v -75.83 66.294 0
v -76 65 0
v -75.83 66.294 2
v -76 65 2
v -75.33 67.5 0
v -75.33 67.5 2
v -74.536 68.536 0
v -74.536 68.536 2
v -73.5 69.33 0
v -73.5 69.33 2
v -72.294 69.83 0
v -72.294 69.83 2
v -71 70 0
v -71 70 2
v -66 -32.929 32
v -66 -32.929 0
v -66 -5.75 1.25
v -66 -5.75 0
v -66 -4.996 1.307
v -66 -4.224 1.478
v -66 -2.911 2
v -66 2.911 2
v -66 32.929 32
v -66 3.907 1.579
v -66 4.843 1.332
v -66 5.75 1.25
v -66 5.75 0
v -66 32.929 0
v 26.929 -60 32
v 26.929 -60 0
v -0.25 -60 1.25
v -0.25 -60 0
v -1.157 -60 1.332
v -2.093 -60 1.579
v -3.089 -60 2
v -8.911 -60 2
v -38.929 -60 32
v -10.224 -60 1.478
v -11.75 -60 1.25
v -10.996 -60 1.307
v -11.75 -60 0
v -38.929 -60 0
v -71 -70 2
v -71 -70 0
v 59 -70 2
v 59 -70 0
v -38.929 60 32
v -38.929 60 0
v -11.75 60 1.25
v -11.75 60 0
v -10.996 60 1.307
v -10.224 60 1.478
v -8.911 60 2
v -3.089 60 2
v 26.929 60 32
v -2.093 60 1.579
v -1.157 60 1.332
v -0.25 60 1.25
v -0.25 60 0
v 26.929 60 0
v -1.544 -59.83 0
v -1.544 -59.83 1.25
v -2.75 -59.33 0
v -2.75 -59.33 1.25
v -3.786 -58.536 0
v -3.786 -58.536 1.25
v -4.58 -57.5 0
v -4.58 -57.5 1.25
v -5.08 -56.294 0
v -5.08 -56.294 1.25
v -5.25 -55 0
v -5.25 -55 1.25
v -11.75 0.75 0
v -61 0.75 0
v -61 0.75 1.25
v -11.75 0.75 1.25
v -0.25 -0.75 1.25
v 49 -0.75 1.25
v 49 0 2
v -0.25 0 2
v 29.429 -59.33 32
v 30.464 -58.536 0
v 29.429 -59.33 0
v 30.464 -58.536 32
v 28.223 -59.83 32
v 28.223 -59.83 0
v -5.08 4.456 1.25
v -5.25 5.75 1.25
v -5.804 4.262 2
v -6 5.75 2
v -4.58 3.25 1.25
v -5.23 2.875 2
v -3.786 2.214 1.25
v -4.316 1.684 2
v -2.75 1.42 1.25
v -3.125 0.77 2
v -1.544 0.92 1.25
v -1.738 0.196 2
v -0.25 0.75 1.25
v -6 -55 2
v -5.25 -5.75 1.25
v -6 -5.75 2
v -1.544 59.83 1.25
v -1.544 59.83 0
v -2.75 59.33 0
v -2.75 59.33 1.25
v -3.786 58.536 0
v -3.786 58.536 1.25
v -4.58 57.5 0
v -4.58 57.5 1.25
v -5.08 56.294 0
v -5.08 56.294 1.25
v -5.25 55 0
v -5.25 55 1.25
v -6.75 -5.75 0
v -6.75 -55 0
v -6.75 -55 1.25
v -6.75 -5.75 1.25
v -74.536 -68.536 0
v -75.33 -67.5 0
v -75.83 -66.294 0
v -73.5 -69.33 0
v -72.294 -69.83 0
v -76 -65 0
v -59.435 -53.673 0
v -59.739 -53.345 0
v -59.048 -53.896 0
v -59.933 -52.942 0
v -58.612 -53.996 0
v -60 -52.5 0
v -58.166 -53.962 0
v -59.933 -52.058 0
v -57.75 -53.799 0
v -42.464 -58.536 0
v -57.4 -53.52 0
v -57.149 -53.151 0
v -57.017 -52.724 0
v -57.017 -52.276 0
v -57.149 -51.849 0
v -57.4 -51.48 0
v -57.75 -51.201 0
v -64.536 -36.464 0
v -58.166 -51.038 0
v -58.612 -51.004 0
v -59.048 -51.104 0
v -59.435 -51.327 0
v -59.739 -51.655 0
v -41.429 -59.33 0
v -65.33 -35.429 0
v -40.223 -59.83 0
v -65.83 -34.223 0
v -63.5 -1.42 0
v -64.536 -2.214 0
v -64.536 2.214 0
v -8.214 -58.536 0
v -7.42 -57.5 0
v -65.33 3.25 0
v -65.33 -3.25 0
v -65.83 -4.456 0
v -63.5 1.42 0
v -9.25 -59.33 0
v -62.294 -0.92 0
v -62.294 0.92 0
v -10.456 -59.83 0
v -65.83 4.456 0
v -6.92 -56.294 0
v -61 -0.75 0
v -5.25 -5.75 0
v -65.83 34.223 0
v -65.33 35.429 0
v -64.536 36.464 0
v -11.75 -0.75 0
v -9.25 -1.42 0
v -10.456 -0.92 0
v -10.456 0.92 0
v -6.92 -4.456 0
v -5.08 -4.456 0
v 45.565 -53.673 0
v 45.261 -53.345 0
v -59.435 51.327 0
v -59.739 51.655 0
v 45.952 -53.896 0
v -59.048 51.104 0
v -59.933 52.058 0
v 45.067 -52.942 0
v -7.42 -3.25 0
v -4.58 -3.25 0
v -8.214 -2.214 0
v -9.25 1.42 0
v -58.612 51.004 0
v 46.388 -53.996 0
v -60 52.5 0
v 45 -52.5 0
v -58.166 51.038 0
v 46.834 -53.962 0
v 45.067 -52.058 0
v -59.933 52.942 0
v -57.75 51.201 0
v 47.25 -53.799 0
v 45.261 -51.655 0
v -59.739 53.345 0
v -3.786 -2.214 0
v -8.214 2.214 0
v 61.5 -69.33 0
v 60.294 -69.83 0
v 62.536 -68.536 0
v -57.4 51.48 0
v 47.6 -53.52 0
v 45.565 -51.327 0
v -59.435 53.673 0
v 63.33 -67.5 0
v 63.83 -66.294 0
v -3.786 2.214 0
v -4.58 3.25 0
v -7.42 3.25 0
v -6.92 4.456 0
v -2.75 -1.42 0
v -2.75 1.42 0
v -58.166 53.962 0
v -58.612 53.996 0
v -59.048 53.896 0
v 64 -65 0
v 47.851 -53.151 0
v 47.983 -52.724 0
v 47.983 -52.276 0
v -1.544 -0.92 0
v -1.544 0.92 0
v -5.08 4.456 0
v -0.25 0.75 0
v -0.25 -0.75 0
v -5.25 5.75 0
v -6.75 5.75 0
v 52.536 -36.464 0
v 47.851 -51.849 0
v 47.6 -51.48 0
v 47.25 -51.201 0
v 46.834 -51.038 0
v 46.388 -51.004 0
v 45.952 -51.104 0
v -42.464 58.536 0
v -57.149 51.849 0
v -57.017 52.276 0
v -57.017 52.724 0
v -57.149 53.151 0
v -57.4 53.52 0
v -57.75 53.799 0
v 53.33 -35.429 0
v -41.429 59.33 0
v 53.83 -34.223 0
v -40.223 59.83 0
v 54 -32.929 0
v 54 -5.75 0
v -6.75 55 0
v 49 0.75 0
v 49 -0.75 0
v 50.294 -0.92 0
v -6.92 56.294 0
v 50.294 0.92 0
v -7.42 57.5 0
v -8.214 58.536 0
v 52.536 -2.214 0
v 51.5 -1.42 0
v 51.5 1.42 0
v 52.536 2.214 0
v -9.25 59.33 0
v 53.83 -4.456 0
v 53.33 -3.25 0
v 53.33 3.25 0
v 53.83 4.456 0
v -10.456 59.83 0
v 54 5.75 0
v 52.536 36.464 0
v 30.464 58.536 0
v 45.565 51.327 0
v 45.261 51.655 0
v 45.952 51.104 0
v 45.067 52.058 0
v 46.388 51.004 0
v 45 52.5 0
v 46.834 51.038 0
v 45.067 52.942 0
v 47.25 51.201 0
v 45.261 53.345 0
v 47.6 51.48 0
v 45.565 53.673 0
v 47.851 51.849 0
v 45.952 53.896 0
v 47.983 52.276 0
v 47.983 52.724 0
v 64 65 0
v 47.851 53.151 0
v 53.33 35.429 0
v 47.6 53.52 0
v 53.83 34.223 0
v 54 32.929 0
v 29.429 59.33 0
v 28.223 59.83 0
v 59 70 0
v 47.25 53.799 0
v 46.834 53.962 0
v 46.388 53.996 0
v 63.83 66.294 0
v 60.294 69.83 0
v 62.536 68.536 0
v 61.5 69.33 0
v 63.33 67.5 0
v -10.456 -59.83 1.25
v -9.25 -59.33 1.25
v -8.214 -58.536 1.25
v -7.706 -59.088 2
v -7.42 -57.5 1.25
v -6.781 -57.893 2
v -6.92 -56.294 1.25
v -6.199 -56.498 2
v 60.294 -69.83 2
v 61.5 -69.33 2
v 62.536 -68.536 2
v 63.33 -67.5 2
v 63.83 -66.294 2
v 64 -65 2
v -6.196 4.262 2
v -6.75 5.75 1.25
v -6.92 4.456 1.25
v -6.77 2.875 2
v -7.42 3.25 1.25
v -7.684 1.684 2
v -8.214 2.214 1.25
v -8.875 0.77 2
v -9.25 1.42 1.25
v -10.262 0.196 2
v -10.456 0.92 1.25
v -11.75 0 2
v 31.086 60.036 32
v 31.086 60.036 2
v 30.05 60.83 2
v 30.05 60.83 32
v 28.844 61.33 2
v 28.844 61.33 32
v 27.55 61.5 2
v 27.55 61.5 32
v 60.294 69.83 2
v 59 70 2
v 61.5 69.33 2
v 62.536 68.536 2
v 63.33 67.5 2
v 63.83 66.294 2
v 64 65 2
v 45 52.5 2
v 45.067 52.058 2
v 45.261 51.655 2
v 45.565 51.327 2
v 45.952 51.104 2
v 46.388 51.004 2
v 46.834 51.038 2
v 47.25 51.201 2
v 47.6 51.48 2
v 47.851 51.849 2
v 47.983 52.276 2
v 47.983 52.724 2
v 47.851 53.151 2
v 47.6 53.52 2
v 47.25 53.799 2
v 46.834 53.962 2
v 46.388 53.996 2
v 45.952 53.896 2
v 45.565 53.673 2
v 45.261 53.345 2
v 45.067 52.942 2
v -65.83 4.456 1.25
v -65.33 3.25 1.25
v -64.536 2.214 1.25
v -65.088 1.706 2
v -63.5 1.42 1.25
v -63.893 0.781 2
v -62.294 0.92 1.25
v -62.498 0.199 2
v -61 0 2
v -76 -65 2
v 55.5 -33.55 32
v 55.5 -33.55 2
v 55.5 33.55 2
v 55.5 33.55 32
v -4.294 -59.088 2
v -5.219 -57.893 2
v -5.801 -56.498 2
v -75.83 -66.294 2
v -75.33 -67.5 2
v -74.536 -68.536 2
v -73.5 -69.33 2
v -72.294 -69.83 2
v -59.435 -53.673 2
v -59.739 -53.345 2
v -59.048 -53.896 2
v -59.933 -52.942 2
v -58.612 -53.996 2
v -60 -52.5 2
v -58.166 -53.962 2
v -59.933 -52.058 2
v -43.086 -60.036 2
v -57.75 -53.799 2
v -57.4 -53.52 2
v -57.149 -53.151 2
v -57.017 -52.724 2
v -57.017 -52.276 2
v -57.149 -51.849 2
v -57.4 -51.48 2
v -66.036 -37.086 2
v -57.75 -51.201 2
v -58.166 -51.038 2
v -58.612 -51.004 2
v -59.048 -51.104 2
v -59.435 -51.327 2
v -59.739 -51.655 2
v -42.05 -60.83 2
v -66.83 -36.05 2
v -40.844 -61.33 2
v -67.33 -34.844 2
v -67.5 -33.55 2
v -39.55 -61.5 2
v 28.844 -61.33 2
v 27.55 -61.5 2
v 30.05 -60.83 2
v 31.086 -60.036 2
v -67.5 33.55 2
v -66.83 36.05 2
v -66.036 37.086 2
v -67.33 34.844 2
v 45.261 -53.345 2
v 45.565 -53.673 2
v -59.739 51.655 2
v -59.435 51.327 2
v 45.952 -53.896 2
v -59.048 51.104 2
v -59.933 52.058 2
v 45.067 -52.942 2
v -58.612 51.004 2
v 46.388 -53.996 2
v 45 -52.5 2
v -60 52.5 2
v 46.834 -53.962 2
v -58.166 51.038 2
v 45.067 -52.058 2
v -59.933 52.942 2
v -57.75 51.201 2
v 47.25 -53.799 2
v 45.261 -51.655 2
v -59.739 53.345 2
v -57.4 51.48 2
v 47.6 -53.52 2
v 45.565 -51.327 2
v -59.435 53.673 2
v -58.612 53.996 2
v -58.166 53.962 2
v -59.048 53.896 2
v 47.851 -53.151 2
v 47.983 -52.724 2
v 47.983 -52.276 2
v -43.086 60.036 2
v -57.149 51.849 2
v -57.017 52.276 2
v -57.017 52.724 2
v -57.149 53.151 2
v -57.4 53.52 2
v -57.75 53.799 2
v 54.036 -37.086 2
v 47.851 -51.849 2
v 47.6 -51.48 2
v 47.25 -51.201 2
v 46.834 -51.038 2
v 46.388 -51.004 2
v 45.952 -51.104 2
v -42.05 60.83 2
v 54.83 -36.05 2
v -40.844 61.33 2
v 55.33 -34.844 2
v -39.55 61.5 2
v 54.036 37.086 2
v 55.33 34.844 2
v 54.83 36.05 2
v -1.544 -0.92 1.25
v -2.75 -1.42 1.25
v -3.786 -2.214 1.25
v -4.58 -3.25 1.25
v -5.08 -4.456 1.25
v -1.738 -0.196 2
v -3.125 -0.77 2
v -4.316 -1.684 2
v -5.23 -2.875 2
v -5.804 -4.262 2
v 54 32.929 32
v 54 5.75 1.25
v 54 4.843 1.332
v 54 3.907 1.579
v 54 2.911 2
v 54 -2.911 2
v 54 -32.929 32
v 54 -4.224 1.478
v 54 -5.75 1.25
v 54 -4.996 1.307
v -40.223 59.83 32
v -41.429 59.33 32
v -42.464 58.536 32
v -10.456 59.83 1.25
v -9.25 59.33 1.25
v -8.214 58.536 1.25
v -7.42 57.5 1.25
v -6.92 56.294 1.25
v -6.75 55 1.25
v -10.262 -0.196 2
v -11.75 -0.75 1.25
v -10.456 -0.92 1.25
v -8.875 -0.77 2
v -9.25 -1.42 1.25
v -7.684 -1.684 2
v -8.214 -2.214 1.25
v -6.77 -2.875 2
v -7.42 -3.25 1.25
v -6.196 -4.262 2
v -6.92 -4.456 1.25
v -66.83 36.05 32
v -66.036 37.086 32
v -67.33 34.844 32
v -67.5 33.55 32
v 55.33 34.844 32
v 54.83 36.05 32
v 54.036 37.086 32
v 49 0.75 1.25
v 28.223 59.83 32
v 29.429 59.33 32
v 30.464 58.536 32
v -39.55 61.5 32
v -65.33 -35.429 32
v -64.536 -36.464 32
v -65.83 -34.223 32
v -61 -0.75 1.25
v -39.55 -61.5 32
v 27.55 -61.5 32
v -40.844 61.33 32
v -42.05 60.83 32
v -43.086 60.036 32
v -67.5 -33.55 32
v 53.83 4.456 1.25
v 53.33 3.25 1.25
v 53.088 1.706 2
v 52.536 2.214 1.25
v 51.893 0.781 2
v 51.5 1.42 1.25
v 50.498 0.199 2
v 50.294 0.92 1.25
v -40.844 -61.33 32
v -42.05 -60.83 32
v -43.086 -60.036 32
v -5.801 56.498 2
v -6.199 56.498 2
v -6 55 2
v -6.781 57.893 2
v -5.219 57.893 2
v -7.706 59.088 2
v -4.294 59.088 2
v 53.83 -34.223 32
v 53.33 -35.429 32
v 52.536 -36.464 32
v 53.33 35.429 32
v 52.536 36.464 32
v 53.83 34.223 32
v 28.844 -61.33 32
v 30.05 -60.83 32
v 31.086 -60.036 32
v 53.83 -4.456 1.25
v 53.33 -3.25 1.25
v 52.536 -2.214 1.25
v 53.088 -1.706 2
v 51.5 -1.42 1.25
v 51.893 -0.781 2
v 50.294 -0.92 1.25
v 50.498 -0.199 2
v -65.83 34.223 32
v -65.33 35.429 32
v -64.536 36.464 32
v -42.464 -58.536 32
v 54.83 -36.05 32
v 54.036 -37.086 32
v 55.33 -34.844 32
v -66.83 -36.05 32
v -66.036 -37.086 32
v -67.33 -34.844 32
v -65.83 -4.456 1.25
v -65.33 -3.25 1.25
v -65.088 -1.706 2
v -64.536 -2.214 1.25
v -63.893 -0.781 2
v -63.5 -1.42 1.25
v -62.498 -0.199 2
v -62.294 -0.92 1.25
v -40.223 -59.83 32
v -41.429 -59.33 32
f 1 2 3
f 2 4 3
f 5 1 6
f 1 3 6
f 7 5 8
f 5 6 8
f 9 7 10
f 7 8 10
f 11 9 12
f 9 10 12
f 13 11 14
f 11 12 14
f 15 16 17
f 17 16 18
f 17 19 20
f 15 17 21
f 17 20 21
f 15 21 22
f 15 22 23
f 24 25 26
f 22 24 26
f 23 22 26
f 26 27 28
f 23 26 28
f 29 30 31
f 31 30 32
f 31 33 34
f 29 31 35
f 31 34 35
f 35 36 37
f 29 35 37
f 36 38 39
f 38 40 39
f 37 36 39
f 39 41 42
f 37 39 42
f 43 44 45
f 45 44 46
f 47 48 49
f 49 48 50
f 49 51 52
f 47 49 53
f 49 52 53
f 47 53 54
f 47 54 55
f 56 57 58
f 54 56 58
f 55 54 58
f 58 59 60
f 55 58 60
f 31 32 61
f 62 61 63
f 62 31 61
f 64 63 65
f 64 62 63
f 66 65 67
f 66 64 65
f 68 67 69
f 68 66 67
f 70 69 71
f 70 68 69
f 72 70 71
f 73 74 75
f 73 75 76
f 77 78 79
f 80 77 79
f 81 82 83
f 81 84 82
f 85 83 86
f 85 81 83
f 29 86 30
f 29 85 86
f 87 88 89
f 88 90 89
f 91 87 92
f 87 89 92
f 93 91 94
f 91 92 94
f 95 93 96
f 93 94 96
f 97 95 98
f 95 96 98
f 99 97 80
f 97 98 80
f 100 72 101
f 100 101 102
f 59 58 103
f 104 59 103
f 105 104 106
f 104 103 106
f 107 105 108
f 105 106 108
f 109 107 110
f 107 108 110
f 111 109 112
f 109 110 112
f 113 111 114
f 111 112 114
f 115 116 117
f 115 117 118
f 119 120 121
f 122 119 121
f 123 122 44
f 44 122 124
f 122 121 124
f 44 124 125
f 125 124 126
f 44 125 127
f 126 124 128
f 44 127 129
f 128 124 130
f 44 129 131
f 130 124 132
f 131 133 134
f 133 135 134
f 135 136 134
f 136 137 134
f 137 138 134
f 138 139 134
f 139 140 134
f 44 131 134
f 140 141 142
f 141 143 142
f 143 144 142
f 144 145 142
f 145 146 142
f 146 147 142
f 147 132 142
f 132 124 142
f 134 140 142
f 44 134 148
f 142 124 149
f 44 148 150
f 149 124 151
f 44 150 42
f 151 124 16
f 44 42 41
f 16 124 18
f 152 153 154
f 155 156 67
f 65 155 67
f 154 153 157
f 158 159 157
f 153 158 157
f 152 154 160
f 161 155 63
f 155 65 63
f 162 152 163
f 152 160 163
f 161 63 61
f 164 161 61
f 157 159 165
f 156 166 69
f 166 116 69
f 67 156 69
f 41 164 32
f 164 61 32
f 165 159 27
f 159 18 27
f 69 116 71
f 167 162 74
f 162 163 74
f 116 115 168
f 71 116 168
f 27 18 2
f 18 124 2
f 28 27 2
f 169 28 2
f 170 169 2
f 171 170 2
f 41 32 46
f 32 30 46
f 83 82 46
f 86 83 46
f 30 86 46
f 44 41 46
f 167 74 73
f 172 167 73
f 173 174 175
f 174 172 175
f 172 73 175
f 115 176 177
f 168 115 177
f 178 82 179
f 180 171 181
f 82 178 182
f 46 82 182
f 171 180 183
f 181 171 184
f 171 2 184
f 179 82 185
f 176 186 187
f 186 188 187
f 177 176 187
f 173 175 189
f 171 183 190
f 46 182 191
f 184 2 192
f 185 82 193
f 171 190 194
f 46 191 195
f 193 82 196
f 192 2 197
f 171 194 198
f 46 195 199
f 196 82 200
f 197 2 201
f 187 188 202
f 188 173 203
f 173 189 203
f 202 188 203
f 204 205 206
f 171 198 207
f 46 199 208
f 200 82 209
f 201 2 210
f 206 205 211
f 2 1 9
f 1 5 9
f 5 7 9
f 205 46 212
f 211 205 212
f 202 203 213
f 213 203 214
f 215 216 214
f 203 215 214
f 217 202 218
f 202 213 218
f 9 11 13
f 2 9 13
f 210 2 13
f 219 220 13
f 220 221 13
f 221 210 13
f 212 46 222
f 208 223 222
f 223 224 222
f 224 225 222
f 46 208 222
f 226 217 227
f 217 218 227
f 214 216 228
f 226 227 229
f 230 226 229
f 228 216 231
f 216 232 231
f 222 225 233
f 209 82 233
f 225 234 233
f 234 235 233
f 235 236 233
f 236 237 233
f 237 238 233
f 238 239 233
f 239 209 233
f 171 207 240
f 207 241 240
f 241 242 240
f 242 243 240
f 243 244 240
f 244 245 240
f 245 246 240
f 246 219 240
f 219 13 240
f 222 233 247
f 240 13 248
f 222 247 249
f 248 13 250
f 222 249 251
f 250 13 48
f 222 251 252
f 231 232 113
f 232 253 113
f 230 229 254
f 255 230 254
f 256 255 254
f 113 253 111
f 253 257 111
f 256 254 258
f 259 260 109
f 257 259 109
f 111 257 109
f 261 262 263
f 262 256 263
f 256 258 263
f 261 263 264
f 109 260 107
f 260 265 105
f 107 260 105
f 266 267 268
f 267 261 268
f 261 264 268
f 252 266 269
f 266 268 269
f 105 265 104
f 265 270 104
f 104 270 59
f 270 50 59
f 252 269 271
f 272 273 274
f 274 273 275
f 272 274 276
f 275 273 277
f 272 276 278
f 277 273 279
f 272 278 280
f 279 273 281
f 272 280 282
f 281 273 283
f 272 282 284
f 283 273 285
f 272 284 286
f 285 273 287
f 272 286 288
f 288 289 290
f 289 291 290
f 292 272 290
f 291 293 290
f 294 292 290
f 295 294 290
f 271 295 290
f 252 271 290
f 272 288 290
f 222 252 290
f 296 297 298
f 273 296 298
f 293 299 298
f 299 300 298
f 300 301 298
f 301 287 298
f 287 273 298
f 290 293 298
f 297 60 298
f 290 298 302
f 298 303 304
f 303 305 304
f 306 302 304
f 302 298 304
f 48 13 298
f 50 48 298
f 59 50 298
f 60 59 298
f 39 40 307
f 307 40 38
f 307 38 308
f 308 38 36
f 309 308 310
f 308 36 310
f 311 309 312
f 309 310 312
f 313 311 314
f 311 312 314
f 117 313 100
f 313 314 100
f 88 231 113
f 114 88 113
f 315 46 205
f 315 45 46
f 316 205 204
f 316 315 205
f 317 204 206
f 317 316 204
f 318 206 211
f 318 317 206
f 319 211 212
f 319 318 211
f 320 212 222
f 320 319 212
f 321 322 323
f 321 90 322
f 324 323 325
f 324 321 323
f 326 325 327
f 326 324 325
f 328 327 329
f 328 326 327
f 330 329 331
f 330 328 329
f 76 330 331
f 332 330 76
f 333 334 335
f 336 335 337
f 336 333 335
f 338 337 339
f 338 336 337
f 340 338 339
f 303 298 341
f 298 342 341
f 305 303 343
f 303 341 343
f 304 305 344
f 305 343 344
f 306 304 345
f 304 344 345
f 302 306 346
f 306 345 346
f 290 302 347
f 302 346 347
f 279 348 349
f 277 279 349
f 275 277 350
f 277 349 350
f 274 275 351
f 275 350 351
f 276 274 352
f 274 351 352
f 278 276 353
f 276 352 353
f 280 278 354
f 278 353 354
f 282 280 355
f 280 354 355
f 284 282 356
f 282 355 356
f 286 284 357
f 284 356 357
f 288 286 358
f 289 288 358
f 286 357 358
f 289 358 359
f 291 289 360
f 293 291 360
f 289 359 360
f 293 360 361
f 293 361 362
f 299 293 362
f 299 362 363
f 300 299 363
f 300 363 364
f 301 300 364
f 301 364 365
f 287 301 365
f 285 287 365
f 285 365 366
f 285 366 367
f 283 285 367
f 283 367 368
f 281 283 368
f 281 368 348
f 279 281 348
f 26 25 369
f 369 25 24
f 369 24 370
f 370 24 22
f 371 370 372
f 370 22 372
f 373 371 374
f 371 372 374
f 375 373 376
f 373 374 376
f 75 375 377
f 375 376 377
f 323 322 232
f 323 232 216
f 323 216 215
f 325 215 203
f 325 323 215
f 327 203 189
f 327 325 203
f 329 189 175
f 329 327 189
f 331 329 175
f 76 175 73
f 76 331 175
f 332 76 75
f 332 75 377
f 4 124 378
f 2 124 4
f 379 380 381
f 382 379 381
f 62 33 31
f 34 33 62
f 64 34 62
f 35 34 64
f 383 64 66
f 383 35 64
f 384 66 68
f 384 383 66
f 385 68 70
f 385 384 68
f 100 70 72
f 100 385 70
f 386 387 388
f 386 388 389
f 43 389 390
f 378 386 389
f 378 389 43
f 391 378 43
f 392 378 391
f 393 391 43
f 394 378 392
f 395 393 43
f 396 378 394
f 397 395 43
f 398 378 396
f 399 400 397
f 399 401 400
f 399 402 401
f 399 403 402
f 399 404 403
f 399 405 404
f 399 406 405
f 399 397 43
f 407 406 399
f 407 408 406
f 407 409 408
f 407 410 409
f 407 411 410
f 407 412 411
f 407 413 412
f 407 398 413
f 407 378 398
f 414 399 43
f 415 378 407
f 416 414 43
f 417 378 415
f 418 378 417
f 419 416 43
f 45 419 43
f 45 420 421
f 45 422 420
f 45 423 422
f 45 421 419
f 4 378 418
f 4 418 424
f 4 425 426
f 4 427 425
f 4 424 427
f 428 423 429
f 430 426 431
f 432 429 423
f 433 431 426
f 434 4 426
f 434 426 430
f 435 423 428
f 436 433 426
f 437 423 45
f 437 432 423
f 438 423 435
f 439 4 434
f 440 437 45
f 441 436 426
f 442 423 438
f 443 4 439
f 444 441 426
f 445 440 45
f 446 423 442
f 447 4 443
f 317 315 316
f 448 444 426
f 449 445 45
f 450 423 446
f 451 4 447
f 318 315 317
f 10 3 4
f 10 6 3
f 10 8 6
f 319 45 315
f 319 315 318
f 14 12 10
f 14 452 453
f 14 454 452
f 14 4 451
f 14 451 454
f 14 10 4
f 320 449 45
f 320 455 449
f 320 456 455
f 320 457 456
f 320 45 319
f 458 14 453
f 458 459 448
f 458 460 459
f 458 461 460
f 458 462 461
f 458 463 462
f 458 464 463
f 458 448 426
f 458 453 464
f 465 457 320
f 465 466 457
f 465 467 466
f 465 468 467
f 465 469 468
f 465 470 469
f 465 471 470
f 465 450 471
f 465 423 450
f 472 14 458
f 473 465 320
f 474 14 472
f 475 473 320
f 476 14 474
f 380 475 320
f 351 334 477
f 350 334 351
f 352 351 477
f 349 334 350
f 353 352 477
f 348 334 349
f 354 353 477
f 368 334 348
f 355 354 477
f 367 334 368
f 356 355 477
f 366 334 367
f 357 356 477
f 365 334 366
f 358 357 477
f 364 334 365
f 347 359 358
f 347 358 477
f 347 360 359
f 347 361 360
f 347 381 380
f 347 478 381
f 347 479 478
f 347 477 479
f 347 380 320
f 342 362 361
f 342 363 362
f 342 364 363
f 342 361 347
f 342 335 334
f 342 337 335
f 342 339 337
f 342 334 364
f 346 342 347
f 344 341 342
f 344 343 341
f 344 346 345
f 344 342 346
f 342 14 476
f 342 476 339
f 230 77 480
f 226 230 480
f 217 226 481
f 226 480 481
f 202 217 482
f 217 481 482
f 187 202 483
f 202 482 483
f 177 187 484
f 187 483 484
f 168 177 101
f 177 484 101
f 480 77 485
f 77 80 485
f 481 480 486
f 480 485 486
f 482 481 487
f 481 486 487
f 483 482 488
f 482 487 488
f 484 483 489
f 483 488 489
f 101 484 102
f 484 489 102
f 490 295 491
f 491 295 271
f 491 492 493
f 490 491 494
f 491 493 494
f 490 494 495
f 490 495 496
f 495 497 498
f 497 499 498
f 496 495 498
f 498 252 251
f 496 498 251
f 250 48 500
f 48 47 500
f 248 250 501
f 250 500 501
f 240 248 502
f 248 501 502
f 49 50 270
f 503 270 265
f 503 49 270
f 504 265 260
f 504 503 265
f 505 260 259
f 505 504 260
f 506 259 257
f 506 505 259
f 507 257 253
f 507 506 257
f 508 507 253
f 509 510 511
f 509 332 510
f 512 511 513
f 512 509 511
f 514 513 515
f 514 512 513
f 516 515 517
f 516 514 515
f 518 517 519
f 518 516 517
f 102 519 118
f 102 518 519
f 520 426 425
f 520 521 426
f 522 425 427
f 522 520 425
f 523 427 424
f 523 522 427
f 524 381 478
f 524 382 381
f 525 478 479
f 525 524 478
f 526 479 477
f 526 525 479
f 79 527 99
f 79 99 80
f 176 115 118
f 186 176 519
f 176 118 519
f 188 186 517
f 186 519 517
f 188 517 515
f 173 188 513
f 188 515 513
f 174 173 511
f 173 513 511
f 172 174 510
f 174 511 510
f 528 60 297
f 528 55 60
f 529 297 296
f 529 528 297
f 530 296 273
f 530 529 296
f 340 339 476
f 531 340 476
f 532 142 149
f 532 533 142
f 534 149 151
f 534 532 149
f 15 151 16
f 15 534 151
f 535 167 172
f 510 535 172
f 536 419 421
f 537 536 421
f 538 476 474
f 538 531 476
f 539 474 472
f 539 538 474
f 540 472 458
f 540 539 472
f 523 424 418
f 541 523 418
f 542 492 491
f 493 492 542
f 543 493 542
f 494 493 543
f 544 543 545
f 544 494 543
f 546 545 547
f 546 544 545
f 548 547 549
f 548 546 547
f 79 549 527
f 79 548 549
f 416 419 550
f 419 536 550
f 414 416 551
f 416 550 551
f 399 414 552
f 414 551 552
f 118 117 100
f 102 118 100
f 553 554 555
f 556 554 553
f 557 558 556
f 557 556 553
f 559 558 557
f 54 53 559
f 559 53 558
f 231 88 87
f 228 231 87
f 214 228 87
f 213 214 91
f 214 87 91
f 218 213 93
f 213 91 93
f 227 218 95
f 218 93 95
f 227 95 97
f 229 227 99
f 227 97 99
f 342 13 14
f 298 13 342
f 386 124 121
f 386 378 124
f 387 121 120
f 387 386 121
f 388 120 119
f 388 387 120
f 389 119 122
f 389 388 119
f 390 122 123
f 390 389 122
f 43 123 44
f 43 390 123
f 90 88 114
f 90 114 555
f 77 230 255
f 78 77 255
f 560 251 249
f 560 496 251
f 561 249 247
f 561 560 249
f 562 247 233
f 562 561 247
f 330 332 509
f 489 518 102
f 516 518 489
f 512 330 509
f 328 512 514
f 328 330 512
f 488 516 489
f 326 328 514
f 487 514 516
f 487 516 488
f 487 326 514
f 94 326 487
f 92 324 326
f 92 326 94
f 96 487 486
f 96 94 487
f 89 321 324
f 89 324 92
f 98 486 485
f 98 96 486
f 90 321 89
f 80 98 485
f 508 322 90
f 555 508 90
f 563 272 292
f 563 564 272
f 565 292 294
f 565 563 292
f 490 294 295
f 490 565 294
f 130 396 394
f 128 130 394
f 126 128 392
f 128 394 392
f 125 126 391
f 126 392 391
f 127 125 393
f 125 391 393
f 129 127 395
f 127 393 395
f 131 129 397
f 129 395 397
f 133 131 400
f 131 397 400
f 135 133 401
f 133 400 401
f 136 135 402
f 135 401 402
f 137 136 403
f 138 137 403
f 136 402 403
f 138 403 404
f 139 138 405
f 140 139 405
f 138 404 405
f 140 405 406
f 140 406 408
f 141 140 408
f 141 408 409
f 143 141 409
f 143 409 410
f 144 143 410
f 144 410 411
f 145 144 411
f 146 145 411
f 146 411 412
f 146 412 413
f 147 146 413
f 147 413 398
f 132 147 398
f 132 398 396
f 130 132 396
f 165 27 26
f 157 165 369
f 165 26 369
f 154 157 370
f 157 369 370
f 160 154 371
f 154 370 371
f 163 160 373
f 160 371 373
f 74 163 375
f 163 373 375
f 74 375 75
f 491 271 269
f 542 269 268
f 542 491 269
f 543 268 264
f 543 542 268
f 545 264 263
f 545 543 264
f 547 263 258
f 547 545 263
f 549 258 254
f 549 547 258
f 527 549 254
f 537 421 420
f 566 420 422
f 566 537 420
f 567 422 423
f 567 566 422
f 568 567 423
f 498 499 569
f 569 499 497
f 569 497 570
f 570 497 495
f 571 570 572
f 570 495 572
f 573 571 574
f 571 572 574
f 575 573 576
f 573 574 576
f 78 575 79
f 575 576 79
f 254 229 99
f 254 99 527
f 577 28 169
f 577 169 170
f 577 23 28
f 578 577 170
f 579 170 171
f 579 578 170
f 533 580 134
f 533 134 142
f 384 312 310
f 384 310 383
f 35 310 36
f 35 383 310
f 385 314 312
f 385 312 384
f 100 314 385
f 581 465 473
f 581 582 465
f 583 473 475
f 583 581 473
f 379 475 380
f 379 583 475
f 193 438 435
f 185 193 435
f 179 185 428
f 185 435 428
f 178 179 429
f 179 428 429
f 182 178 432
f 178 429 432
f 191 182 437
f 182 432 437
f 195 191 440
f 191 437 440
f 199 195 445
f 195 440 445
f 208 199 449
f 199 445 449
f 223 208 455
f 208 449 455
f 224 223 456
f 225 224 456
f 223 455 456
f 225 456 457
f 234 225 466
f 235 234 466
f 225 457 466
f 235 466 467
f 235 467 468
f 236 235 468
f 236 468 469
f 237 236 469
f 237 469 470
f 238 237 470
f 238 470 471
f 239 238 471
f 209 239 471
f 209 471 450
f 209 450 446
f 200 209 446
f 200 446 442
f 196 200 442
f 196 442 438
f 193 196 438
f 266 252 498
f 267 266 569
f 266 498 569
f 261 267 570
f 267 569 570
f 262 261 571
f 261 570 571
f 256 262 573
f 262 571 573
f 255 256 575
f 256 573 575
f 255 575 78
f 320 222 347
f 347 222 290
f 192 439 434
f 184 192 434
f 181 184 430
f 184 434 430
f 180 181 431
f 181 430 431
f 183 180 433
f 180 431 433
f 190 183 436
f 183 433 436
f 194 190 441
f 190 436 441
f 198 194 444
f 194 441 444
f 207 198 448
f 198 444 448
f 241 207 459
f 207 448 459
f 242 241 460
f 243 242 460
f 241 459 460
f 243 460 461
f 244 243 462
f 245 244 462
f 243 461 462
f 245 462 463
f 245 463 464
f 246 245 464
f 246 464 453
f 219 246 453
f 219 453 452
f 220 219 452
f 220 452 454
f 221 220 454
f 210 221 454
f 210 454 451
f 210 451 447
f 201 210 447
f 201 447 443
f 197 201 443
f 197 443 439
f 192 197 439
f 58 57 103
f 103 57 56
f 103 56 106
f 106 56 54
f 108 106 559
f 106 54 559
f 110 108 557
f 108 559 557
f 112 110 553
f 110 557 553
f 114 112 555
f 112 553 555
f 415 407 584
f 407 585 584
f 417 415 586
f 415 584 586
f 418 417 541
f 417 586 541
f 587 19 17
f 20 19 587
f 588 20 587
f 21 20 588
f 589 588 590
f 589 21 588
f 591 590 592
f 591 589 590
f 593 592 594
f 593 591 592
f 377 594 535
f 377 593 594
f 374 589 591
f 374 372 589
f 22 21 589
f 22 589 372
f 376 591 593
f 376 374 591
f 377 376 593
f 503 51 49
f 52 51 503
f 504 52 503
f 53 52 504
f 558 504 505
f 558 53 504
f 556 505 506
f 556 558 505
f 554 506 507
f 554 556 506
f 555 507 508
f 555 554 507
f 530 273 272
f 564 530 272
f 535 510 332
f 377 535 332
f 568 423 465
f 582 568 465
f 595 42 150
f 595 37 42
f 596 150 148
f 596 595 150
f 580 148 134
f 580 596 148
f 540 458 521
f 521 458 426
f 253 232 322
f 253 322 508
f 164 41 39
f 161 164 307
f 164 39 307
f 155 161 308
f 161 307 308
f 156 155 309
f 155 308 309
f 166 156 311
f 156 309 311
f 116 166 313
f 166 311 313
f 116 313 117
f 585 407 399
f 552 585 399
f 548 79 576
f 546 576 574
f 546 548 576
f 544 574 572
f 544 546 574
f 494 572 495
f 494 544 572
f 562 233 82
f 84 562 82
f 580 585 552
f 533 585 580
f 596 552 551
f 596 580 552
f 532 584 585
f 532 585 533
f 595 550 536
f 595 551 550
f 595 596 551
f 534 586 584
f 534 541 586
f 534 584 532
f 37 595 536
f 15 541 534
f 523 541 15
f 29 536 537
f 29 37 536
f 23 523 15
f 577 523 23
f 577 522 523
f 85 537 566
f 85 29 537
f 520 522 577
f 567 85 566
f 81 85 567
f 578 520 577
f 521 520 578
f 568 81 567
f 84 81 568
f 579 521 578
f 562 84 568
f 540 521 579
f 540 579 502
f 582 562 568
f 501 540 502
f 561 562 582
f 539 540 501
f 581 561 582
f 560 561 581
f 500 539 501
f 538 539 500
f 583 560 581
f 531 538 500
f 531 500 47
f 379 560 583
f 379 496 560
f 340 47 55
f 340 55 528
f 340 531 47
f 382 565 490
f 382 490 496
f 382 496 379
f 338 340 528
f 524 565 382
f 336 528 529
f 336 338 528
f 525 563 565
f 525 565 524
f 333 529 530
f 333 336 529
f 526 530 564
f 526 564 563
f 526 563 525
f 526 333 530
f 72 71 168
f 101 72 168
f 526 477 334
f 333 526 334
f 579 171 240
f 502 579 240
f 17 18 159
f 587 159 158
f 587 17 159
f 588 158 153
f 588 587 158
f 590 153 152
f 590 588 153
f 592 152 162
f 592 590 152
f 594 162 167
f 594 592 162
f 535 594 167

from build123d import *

# Parameters (mm, degrees)
F0_W         = 59.25
F0_H         = 1.5
F0_W_2       = 1.5
F0_H_2       = 59.25
F1_DEPTH     = 2
F0_W_3       = 140
F0_H_3       = 140
F2_DEPTH     = 32
F3_D         = 3
F4_R         = 5
F5_T1_DEPTH  = 49.25
F5_T3_DEPTH  = 49.25
F5_T5_DEPTH  = 49.25
F5_T7_DEPTH  = 49.25
F5_T12_ANGLE = 127.5884718038
F5_T15_ANGLE = 90
F5_T19_ANGLE = 127.5884718038
F5_T24_ANGLE = 127.5884718038
F5_T27_ANGLE = 90
F5_T31_ANGLE = 127.5884718038
F5_T36_ANGLE = 127.5884718038
F5_T39_ANGLE = 90
F5_T43_ANGLE = 127.5884718038
F5_T48_ANGLE = 127.5884718038
F5_T53_ANGLE = 127.5884718038
F5_T56_ANGLE = 90


# Not quite as in the source:
# - a fillet or chamfer that OpenCascade refuses, or shapes differently, is made with other operations: its cross-section is extruded or revolved along the edge and cut away or added


with BuildPart() as f1:
    # F0 (on Top) → F1 (new body)
    with BuildSketch(Plane.XY):
        with Locations((-36.375, 0)):
            Rectangle(F0_W, F0_H)
        with Locations((-6, 30.375)):
            Rectangle(F0_W_2, F0_H_2)
        with Locations((-6, -30.375)):
            Rectangle(F0_W_2, F0_H_2)
        with Locations((24.375, 0)):
            Rectangle(F0_W, F0_H)
        with Locations((-6, 0)):
            Rectangle(F0_W_2, F0_H)
    extrude(amount=F1_DEPTH)



with BuildPart() as f1b:
    # F0 (on Top) → F1, piece 2 (new body)
    with BuildSketch(Plane.XY):
        with Locations((-6, 0)):
            Rectangle(F0_W_3, F0_H_3)
        Polygon((55.5000009226, -35.6213207257), (29.6213207257, -61.5000009226), (-41.6213207257, -61.5000009226), (-67.5000009226, -35.6213207257), (-67.5000009226, 35.6213207257), (-41.6213207257, 61.5000009226), (29.6213207257, 61.5000009226), (55.5000009226, 35.6213207257), align=None, mode=Mode.SUBTRACT)
    extrude(amount=F1_DEPTH)


with BuildPart() as f1_1:
    add(f1.part)

    add(f1b.part)  # F2 merges F1b
    # F0 (on Top) → F2 (join)
    with BuildSketch(Plane.XY):
        Polygon((-41.6213207257, -61.5000009226), (29.6213207257, -61.5000009226), (55.5000009226, -35.6213207257), (55.5000009226, 35.6213207257), (29.6213207257, 61.5000009226), (-41.6213207257, 61.5000009226), (-67.5000009226, 35.6213207257), (-67.5000009226, -35.6213207257), align=None)
        Polygon((29, 60), (54, 35), (54, 0.75), (54, -0.75), (54, -35), (29, -60), (-5.25, -60), (-6.75, -60), (-41, -60), (-66, -35), (-66, -0.75), (-66, 0.75), (-66, 35), (-41, 60), (-6.75, 60), (-5.25, 60), align=None, mode=Mode.SUBTRACT)
    extrude(amount=F2_DEPTH)

    # F3 (through all)
    with Locations(Plane(origin=(0, 0, 0), x_dir=(1, 0, 0), z_dir=(0, 0, -1))):
        with Locations((-58.5, -52.5), (-58.5, 52.5), (46.5, 52.5), (46.5, -52.5)):
            Hole(F3_D / 2)

    # F4
    f4_edges = [f1_1.edges().sort_by_distance(p)[0] for p in [
        (-6.75, 60, 1),
        (-6.75, 0.75, 1),
        (-41, 60, 16),
        (-66, 35, 16),
        (-66, -0.75, 1),
        (-66, 0.75, 1),
        (-66, -35, 16),
        (-6.75, -0.75, 1),
        (-6.75, -60, 1),
        (29, -60, 16),
        (54, -35, 16),
        (54, -0.75, 1),
        (-5.25, -0.75, 1),
        (-5.25, -60, 1),
        (29, 60, 16),
        (54, 35, 16),
        (54, 0.75, 1),
        (-5.25, 0.75, 1),
        (-5.25, 60, 1),
        (-41, -60, 16),
        (-76, -70, 1),
        (64, -70, 1),
        (64, 70, 1),
        (-76, 70, 1),
        (-67.500001, -35.621321, 17),
        (-41.621321, -61.500001, 17),
        (29.621321, -61.500001, 17),
        (55.500001, -35.621321, 17),
        (55.500001, 35.621321, 17),
        (29.621321, 61.500001, 17),
        (-41.621321, 61.500001, 17),
        (-67.500001, 35.621321, 17),
    ]]
    fillet(f4_edges, radius=F4_R)

    # F5: chamfer of 0.75 on 20 edges, made by hand

    # F5_s2 → F5_t1 (cut)
    with BuildSketch(Plane.YZ.offset(-61)):
        Polygon((-0.75, 1.25), (0, 2), (-0.75, 2), align=None)
        Polygon((0.75, 1.25), (0, 2), (0.75, 2), align=None)
    extrude(amount=F5_T1_DEPTH, mode=Mode.SUBTRACT)

    # F5_s4 → F5_t3 (cut)
    with BuildSketch(Plane.YZ.offset(-0.25)):
        Polygon((-0.75, 1.25), (0, 2), (-0.75, 2), align=None)
        Polygon((0.75, 1.25), (0, 2), (0.75, 2), align=None)
    extrude(amount=F5_T3_DEPTH, mode=Mode.SUBTRACT)

    # F5_s6 → F5_t5 (cut)
    with BuildSketch(Plane.XZ.offset(-55)):
        Polygon((-5.25, 1.25), (-6, 2), (-5.25, 2), align=None)
        Polygon((-6.75, 1.25), (-6, 2), (-6.75, 2), align=None)
    extrude(amount=F5_T5_DEPTH, mode=Mode.SUBTRACT)

    # F5_s8 → F5_t7 (cut)
    with BuildSketch(Plane.XZ.offset(5.75)):
        Polygon((-6.75, 1.25), (-6, 2), (-6.75, 2), align=None)
        Polygon((-5.25, 1.25), (-6, 2), (-5.25, 2), align=None)
    extrude(amount=F5_T7_DEPTH, mode=Mode.SUBTRACT)


with BuildPart() as f5_tool10:
    # F5_s11 → F5_t12 (revolve)
    with BuildSketch(Plane(origin=(-19.9177172188, 25.8744507102, 0), x_dir=(0, 0, 1), z_dir=(0.6099857389, -0.7924123916, 0))):
        Polygon((1.25, 56.8445738842), (2, 57.5945738842), (2, 56.8445738842), align=None)
    revolve(axis=Axis((-61, -5.75, 2), (0, 0, -1)), revolution_arc=F5_T12_ANGLE)

    split(bisect_by=Plane.YZ.offset(-66), keep=Keep.TOP)


with BuildPart() as f1_2:
    add(f1_1.part)

    # F5_t9: cut F5_tool10
    add(f5_tool10.part, mode=Mode.SUBTRACT)

    # F5_s14 → F5_t15 (revolve, cut)
    with BuildSketch(Plane.YZ.offset(-11.75)):
        Polygon((-0.75, 1.25), (0, 2), (-0.75, 2), align=None)
    revolve(axis=Axis((-11.75, -5.75, 2), (0, 0, -1)), revolution_arc=F5_T15_ANGLE, mode=Mode.SUBTRACT)


with BuildPart() as f5_tool17:
    # F5_s18 → F5_t19 (revolve)
    with BuildSketch(Plane(origin=(19.2067847712, -14.7850600594, 0), x_dir=(0, 0, 1), z_dir=(-0.7924123916, 0.6099857389, 0))):
        Polygon((1.25, -55.7500139684), (2, -56.5000139684), (2, -55.7500139684), align=None)
    revolve(axis=Axis((-11.75, -55, 2), (0, 0, 1)), revolution_arc=F5_T19_ANGLE)

    split(bisect_by=Plane.XZ.offset(60), keep=Keep.BOTTOM)


with BuildPart() as f1_3:
    add(f1_2.part)

    # F5_t16: cut F5_tool17
    add(f5_tool17.part, mode=Mode.SUBTRACT)


with BuildPart() as f5_tool22:
    # F5_s23 → F5_t24 (revolve)
    with BuildSketch(Plane(origin=(15.4527259985, 20.0741276118, 0), x_dir=(0, 0, 1), z_dir=(-0.6099857389, -0.7924123916, 0))):
        Polygon((1.25, -47.3356251854), (2, -48.0856251854), (2, -47.3356251854), align=None)
    revolve(axis=Axis((49, -5.75, 2), (0, 0, 1)), revolution_arc=F5_T24_ANGLE)

    split(bisect_by=Plane.YZ.offset(54), keep=Keep.BOTTOM)


with BuildPart() as f1_4:
    add(f1_3.part)

    # F5_t21: cut F5_tool22
    add(f5_tool22.part, mode=Mode.SUBTRACT)

    # F5_s26 → F5_t27 (revolve, cut)
    with BuildSketch(Plane.YZ.offset(-0.25)):
        Polygon((-0.75, 1.25), (0, 2), (-0.75, 2), align=None)
    revolve(axis=Axis((-0.25, -5.75, 2), (0, 0, 1)), revolution_arc=F5_T27_ANGLE, mode=Mode.SUBTRACT)


with BuildPart() as f5_tool29:
    # F5_s30 → F5_t31 (revolve)
    with BuildSketch(Plane(origin=(-26.7417935508, -20.5853831579, 0), x_dir=(0, 0, 1), z_dir=(0.7924123916, 0.6099857389, 0))):
        Polygon((1.25, 48.4301851013), (2, 49.1801851013), (2, 48.4301851013), align=None)
    revolve(axis=Axis((-0.25, -55, 2), (0, 0, -1)), revolution_arc=F5_T31_ANGLE)

    split(bisect_by=Plane.XZ.offset(60), keep=Keep.BOTTOM)


with BuildPart() as f1_5:
    add(f1_4.part)

    # F5_t28: cut F5_tool29
    add(f5_tool29.part, mode=Mode.SUBTRACT)


with BuildPart() as f5_tool34:
    # F5_s35 → F5_t36 (revolve)
    with BuildSketch(Plane(origin=(19.2067847712, 14.7850600594, 0), x_dir=(0, 0, 1), z_dir=(-0.7924123916, -0.6099857389, 0))):
        Polygon((1.25, 55.7500139684), (2, 56.5000139684), (2, 55.7500139684), align=None)
    revolve(axis=Axis((-11.75, 55, 2), (0, 0, -1)), revolution_arc=F5_T36_ANGLE)

    split(bisect_by=Plane.XZ.offset(-60), keep=Keep.TOP)


with BuildPart() as f1_6:
    add(f1_5.part)

    # F5_t33: cut F5_tool34
    add(f5_tool34.part, mode=Mode.SUBTRACT)

    # F5_s38 → F5_t39 (revolve, cut)
    with BuildSketch(Plane.XZ.offset(-5.75)):
        Polygon((-6.75, 1.25), (-6, 2), (-6.75, 2), align=None)
    revolve(axis=Axis((-11.75, 5.75, 2), (0, 0, -1)), revolution_arc=F5_T39_ANGLE, mode=Mode.SUBTRACT)


with BuildPart() as f5_tool41:
    # F5_s42 → F5_t43 (revolve)
    with BuildSketch(Plane(origin=(-19.9177172188, -25.8744507102, 0), x_dir=(0, 0, 1), z_dir=(0.6099857389, 0.7924123916, 0))):
        Polygon((1.25, -56.8445738842), (2, -57.5945738842), (2, -56.8445738842), align=None)
    revolve(axis=Axis((-61, 5.75, 2), (0, 0, 1)), revolution_arc=F5_T43_ANGLE)

    split(bisect_by=Plane.YZ.offset(-66), keep=Keep.TOP)


with BuildPart() as f1_7:
    add(f1_6.part)

    # F5_t40: cut F5_tool41
    add(f5_tool41.part, mode=Mode.SUBTRACT)


with BuildPart() as f5_tool46:
    # F5_s47 → F5_t48 (revolve)
    with BuildSketch(Plane(origin=(-26.7417935508, 20.5853831579, 0), x_dir=(0, 0, 1), z_dir=(0.7924123916, -0.6099857389, 0))):
        Polygon((1.25, -48.4301851013), (2, -49.1801851013), (2, -48.4301851013), align=None)
    revolve(axis=Axis((-0.25, 55, 2), (0, 0, 1)), revolution_arc=F5_T48_ANGLE)

    split(bisect_by=Plane.XZ.offset(-60), keep=Keep.TOP)


with BuildPart() as f1_8:
    add(f1_7.part)

    # F5_t45: cut F5_tool46
    add(f5_tool46.part, mode=Mode.SUBTRACT)


with BuildPart() as f5_tool51:
    # F5_s52 → F5_t53 (revolve)
    with BuildSketch(Plane(origin=(15.4527259985, -20.0741276118, 0), x_dir=(0, 0, 1), z_dir=(-0.6099857389, 0.7924123916, 0))):
        Polygon((1.25, 47.3356251854), (2, 48.0856251854), (2, 47.3356251854), align=None)
    revolve(axis=Axis((49, 5.75, 2), (0, 0, -1)), revolution_arc=F5_T53_ANGLE)

    split(bisect_by=Plane.YZ.offset(54), keep=Keep.BOTTOM)


with BuildPart() as f1_9:
    add(f1_8.part)

    # F5_t50: cut F5_tool51
    add(f5_tool51.part, mode=Mode.SUBTRACT)

    # F5_s55 → F5_t56 (revolve, cut)
    with BuildSketch(Plane.XZ.offset(-5.75)):
        Polygon((-5.25, 1.25), (-6, 2), (-5.25, 2), align=None)
    revolve(axis=Axis((-0.25, 5.75, 2), (0, 0, 1)), revolution_arc=F5_T56_ANGLE, mode=Mode.SUBTRACT)


solid = f1_9.part
